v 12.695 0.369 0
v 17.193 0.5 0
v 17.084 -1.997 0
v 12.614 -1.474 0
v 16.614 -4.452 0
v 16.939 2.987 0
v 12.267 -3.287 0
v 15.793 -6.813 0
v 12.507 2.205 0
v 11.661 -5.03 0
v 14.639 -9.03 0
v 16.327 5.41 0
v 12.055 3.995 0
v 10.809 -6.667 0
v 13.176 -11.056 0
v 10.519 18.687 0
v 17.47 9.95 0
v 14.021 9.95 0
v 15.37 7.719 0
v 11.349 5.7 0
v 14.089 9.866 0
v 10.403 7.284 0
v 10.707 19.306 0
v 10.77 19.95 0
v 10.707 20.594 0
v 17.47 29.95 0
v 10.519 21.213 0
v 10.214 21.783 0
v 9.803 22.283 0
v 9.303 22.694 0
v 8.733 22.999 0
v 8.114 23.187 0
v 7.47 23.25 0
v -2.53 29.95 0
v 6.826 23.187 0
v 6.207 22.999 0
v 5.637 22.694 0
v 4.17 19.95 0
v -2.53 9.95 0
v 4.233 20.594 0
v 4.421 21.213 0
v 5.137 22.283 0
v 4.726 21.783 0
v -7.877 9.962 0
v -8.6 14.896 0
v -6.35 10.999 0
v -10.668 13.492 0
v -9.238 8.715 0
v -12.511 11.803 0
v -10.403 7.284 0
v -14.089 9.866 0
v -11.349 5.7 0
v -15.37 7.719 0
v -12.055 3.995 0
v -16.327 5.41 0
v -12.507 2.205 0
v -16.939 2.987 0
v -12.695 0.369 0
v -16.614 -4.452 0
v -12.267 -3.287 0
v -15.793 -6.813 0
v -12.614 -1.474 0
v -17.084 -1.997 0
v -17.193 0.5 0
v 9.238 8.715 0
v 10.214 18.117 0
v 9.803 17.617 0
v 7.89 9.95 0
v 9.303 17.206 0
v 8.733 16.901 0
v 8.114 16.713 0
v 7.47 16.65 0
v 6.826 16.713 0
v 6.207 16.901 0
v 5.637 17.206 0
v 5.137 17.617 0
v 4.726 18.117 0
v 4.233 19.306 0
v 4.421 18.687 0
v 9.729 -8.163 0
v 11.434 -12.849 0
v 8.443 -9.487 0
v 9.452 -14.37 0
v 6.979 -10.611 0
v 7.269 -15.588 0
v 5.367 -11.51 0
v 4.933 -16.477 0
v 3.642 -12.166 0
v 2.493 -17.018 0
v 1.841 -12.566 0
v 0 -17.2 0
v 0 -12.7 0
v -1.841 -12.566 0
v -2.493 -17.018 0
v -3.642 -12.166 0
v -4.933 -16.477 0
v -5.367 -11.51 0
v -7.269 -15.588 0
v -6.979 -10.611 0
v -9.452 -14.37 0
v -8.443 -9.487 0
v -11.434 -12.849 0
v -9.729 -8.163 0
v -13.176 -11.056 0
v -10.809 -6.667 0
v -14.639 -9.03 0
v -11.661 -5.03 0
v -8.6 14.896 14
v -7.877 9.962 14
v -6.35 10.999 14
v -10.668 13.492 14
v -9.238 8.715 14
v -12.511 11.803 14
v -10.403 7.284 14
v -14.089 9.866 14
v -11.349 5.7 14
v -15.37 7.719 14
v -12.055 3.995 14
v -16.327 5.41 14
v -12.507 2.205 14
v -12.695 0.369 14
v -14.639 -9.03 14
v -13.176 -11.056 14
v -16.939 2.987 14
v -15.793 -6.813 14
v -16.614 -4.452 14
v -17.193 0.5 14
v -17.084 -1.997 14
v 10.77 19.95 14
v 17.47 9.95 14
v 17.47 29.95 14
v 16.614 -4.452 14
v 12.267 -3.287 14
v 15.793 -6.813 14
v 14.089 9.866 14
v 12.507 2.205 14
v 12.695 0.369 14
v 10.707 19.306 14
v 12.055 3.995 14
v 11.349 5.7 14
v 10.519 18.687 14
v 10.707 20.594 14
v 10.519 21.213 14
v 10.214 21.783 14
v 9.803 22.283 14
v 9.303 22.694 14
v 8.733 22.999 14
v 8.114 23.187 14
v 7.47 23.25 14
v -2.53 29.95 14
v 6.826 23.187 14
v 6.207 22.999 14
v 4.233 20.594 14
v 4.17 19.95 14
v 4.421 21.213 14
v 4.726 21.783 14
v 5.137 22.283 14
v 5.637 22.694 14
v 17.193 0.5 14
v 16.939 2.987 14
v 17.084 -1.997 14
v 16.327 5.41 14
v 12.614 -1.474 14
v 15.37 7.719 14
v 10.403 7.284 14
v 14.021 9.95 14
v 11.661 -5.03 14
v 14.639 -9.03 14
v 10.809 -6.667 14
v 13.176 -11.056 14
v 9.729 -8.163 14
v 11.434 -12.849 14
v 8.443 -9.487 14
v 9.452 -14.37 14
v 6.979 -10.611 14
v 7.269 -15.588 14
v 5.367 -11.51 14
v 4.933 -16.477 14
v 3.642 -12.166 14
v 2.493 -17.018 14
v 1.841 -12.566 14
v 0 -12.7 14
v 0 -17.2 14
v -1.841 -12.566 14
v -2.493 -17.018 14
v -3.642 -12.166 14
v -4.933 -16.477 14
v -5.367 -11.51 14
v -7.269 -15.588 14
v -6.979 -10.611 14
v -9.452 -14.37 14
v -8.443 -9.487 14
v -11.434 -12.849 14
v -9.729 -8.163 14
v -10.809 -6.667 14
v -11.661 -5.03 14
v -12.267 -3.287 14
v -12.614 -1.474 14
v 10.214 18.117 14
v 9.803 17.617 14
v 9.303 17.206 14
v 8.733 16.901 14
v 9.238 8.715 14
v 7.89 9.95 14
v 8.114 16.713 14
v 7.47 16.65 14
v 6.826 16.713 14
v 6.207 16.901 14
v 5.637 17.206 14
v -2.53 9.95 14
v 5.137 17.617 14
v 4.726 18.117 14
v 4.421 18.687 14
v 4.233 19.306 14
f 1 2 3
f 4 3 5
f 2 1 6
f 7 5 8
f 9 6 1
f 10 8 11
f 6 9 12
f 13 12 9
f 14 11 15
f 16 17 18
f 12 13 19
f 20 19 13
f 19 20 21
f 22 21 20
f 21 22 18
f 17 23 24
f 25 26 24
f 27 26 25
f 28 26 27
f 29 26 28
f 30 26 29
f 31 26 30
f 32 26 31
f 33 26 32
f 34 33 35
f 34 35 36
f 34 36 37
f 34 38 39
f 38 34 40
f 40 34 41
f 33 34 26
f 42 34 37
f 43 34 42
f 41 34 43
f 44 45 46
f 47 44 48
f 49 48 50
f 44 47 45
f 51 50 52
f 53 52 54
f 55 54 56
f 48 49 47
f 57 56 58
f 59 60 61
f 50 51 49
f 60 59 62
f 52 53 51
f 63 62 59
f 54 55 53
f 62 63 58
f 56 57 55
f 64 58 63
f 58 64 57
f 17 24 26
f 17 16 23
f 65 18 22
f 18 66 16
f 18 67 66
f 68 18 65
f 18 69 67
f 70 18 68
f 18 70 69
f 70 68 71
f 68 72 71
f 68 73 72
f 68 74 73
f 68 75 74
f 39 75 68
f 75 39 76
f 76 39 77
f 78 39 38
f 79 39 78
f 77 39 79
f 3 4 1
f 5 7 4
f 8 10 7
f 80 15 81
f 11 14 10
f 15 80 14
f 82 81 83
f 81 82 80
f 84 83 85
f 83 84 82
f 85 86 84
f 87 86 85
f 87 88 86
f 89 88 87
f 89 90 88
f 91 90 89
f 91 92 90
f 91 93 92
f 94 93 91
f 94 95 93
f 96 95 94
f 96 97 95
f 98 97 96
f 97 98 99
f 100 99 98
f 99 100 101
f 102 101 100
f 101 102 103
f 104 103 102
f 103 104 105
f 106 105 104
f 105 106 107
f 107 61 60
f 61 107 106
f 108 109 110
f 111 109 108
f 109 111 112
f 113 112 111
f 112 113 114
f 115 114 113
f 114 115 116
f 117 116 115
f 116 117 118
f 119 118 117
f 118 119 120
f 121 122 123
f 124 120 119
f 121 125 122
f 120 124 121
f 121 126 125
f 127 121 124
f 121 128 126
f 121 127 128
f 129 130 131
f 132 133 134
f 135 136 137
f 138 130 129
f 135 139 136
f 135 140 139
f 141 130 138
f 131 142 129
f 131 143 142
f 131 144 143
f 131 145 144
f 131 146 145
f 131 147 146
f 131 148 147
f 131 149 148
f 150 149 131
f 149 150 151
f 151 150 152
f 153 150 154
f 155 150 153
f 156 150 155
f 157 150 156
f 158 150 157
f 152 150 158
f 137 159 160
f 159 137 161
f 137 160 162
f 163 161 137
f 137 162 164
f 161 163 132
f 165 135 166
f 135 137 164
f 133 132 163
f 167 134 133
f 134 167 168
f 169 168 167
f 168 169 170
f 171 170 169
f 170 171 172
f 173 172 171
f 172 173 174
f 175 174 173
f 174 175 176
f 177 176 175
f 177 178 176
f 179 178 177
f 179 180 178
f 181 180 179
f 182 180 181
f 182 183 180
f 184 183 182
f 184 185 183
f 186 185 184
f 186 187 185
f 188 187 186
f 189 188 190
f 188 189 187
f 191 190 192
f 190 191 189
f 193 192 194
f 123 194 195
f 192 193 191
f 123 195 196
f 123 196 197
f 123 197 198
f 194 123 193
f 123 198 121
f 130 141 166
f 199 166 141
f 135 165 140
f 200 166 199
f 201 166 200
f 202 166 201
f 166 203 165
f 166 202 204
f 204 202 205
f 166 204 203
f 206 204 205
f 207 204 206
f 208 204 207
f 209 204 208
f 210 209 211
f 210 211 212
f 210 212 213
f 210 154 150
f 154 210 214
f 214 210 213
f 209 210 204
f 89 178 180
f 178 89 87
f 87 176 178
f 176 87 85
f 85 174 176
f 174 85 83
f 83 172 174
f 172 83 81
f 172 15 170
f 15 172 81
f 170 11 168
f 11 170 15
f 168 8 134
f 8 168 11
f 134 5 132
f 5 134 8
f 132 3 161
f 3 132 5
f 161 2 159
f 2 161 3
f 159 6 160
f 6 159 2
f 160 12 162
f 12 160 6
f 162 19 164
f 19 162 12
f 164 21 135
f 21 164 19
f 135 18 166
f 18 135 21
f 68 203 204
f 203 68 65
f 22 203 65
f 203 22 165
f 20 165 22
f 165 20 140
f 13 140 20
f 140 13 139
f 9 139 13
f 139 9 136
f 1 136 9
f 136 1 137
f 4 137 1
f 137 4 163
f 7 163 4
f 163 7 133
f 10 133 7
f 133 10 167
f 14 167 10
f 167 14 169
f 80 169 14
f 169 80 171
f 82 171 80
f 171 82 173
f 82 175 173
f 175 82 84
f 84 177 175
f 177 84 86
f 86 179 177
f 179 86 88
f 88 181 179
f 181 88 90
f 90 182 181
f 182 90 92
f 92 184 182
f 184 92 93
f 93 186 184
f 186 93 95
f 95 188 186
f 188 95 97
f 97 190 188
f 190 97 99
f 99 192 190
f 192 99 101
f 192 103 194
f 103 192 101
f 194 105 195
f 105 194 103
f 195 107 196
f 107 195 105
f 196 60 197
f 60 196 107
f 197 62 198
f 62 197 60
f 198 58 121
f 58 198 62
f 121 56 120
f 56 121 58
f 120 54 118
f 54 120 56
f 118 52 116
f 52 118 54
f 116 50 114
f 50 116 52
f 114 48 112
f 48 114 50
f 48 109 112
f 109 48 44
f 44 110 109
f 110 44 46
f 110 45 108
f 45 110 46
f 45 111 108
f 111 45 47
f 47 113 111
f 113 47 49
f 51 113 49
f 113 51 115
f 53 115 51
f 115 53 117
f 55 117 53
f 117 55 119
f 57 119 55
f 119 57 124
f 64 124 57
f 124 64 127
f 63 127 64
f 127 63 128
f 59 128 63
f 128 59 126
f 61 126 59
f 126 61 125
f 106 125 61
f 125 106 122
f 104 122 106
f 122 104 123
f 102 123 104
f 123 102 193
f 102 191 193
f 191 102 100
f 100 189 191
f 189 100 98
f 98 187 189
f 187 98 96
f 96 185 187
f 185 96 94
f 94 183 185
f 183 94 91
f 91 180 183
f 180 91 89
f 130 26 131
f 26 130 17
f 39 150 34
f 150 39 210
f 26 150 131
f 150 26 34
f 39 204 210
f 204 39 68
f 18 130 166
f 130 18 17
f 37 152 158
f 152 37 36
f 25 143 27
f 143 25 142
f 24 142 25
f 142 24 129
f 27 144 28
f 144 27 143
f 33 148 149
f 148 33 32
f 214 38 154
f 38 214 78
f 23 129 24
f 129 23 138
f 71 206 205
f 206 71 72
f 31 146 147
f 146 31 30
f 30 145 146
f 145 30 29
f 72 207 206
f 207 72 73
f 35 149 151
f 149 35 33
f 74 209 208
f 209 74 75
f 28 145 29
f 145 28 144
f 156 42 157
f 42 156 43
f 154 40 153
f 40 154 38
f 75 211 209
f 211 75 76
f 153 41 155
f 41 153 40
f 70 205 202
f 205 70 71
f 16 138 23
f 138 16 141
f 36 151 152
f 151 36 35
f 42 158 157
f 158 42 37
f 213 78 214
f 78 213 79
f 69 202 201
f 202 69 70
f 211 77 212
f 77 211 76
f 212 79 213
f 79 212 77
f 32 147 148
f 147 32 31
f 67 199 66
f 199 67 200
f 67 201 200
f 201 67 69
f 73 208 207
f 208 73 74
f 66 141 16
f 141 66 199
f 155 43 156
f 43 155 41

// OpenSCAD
$fn = 32;

// ----------------------------------------------------------------------
// Pipe clamp: 34.4 mm ring, 4.5 mm wall, 14 mm wide
// ----------------------------------------------------------------------

// --- parameters (mm) ---
outer_r = 17.2;           // clamp outside radius
inner_r = 12.7;           // pipe bore radius
band = 4.5;               // band thickness
clamp_w = 14;             // clamp width
opening = 60;             // opening angle between the ends
lug_w = 20;               // lug width
lug_len = 20;             // lug length
bolt_d = 6.6;             // bolt hole

clamp_profile = [[-8.6, 14.896], [-10.668, 13.492], [-12.511, 11.803], [-14.089, 9.866], [-15.37, 7.719], [-16.327, 5.41], [-16.939, 2.987], [-17.193, 0.5], [-17.084, -1.997], [-16.614, -4.452], [-15.793, -6.813], [-14.639, -9.03], [-13.176, -11.056], [-11.434, -12.849], [-9.452, -14.37], [-7.269, -15.588], [-4.933, -16.477], [-2.493, -17.018], [0, -17.2], [2.493, -17.018], [4.933, -16.477], [7.269, -15.588], [9.452, -14.37], [11.434, -12.849], [13.176, -11.056], [14.639, -9.03], [15.793, -6.813], [16.614, -4.452], [17.084, -1.997], [17.193, 0.5], [16.939, 2.987], [16.327, 5.41], [15.37, 7.719], [14.089, 9.866], [12.511, 11.803], [10.668, 13.492], [8.6, 14.896], [6.35, 10.999], [7.877, 9.962], [9.238, 8.715], [10.403, 7.284], [11.349, 5.7], [12.055, 3.995], [12.507, 2.205], [12.695, 0.369], [12.614, -1.474], [12.267, -3.287], [11.661, -5.03], [10.809, -6.667], [9.729, -8.163], [8.443, -9.487], [6.979, -10.611], [5.367, -11.51], [3.642, -12.166], [1.841, -12.566], [0, -12.7], [-1.841, -12.566], [-3.642, -12.166], [-5.367, -11.51], [-6.979, -10.611], [-8.443, -9.487], [-9.729, -8.163], [-10.809, -6.667], [-11.661, -5.03], [-12.267, -3.287], [-12.614, -1.474], [-12.695, 0.369], [-12.507, 2.205], [-12.055, 3.995], [-11.349, 5.7], [-10.403, 7.284], [-9.238, 8.715], [-7.877, 9.962], [-6.35, 10.999]];

difference() {
  union() {
    linear_extrude(height = clamp_w) polygon(clamp_profile);
    /* bolt lug on the other end */
    translate([-2.53, 9.95, 0]) cube([lug_w, 20, clamp_w]);
  }
  translate([7.47, 19.95, -2.5]) cylinder(h = clamp_w + 5, d = bolt_d);
}
